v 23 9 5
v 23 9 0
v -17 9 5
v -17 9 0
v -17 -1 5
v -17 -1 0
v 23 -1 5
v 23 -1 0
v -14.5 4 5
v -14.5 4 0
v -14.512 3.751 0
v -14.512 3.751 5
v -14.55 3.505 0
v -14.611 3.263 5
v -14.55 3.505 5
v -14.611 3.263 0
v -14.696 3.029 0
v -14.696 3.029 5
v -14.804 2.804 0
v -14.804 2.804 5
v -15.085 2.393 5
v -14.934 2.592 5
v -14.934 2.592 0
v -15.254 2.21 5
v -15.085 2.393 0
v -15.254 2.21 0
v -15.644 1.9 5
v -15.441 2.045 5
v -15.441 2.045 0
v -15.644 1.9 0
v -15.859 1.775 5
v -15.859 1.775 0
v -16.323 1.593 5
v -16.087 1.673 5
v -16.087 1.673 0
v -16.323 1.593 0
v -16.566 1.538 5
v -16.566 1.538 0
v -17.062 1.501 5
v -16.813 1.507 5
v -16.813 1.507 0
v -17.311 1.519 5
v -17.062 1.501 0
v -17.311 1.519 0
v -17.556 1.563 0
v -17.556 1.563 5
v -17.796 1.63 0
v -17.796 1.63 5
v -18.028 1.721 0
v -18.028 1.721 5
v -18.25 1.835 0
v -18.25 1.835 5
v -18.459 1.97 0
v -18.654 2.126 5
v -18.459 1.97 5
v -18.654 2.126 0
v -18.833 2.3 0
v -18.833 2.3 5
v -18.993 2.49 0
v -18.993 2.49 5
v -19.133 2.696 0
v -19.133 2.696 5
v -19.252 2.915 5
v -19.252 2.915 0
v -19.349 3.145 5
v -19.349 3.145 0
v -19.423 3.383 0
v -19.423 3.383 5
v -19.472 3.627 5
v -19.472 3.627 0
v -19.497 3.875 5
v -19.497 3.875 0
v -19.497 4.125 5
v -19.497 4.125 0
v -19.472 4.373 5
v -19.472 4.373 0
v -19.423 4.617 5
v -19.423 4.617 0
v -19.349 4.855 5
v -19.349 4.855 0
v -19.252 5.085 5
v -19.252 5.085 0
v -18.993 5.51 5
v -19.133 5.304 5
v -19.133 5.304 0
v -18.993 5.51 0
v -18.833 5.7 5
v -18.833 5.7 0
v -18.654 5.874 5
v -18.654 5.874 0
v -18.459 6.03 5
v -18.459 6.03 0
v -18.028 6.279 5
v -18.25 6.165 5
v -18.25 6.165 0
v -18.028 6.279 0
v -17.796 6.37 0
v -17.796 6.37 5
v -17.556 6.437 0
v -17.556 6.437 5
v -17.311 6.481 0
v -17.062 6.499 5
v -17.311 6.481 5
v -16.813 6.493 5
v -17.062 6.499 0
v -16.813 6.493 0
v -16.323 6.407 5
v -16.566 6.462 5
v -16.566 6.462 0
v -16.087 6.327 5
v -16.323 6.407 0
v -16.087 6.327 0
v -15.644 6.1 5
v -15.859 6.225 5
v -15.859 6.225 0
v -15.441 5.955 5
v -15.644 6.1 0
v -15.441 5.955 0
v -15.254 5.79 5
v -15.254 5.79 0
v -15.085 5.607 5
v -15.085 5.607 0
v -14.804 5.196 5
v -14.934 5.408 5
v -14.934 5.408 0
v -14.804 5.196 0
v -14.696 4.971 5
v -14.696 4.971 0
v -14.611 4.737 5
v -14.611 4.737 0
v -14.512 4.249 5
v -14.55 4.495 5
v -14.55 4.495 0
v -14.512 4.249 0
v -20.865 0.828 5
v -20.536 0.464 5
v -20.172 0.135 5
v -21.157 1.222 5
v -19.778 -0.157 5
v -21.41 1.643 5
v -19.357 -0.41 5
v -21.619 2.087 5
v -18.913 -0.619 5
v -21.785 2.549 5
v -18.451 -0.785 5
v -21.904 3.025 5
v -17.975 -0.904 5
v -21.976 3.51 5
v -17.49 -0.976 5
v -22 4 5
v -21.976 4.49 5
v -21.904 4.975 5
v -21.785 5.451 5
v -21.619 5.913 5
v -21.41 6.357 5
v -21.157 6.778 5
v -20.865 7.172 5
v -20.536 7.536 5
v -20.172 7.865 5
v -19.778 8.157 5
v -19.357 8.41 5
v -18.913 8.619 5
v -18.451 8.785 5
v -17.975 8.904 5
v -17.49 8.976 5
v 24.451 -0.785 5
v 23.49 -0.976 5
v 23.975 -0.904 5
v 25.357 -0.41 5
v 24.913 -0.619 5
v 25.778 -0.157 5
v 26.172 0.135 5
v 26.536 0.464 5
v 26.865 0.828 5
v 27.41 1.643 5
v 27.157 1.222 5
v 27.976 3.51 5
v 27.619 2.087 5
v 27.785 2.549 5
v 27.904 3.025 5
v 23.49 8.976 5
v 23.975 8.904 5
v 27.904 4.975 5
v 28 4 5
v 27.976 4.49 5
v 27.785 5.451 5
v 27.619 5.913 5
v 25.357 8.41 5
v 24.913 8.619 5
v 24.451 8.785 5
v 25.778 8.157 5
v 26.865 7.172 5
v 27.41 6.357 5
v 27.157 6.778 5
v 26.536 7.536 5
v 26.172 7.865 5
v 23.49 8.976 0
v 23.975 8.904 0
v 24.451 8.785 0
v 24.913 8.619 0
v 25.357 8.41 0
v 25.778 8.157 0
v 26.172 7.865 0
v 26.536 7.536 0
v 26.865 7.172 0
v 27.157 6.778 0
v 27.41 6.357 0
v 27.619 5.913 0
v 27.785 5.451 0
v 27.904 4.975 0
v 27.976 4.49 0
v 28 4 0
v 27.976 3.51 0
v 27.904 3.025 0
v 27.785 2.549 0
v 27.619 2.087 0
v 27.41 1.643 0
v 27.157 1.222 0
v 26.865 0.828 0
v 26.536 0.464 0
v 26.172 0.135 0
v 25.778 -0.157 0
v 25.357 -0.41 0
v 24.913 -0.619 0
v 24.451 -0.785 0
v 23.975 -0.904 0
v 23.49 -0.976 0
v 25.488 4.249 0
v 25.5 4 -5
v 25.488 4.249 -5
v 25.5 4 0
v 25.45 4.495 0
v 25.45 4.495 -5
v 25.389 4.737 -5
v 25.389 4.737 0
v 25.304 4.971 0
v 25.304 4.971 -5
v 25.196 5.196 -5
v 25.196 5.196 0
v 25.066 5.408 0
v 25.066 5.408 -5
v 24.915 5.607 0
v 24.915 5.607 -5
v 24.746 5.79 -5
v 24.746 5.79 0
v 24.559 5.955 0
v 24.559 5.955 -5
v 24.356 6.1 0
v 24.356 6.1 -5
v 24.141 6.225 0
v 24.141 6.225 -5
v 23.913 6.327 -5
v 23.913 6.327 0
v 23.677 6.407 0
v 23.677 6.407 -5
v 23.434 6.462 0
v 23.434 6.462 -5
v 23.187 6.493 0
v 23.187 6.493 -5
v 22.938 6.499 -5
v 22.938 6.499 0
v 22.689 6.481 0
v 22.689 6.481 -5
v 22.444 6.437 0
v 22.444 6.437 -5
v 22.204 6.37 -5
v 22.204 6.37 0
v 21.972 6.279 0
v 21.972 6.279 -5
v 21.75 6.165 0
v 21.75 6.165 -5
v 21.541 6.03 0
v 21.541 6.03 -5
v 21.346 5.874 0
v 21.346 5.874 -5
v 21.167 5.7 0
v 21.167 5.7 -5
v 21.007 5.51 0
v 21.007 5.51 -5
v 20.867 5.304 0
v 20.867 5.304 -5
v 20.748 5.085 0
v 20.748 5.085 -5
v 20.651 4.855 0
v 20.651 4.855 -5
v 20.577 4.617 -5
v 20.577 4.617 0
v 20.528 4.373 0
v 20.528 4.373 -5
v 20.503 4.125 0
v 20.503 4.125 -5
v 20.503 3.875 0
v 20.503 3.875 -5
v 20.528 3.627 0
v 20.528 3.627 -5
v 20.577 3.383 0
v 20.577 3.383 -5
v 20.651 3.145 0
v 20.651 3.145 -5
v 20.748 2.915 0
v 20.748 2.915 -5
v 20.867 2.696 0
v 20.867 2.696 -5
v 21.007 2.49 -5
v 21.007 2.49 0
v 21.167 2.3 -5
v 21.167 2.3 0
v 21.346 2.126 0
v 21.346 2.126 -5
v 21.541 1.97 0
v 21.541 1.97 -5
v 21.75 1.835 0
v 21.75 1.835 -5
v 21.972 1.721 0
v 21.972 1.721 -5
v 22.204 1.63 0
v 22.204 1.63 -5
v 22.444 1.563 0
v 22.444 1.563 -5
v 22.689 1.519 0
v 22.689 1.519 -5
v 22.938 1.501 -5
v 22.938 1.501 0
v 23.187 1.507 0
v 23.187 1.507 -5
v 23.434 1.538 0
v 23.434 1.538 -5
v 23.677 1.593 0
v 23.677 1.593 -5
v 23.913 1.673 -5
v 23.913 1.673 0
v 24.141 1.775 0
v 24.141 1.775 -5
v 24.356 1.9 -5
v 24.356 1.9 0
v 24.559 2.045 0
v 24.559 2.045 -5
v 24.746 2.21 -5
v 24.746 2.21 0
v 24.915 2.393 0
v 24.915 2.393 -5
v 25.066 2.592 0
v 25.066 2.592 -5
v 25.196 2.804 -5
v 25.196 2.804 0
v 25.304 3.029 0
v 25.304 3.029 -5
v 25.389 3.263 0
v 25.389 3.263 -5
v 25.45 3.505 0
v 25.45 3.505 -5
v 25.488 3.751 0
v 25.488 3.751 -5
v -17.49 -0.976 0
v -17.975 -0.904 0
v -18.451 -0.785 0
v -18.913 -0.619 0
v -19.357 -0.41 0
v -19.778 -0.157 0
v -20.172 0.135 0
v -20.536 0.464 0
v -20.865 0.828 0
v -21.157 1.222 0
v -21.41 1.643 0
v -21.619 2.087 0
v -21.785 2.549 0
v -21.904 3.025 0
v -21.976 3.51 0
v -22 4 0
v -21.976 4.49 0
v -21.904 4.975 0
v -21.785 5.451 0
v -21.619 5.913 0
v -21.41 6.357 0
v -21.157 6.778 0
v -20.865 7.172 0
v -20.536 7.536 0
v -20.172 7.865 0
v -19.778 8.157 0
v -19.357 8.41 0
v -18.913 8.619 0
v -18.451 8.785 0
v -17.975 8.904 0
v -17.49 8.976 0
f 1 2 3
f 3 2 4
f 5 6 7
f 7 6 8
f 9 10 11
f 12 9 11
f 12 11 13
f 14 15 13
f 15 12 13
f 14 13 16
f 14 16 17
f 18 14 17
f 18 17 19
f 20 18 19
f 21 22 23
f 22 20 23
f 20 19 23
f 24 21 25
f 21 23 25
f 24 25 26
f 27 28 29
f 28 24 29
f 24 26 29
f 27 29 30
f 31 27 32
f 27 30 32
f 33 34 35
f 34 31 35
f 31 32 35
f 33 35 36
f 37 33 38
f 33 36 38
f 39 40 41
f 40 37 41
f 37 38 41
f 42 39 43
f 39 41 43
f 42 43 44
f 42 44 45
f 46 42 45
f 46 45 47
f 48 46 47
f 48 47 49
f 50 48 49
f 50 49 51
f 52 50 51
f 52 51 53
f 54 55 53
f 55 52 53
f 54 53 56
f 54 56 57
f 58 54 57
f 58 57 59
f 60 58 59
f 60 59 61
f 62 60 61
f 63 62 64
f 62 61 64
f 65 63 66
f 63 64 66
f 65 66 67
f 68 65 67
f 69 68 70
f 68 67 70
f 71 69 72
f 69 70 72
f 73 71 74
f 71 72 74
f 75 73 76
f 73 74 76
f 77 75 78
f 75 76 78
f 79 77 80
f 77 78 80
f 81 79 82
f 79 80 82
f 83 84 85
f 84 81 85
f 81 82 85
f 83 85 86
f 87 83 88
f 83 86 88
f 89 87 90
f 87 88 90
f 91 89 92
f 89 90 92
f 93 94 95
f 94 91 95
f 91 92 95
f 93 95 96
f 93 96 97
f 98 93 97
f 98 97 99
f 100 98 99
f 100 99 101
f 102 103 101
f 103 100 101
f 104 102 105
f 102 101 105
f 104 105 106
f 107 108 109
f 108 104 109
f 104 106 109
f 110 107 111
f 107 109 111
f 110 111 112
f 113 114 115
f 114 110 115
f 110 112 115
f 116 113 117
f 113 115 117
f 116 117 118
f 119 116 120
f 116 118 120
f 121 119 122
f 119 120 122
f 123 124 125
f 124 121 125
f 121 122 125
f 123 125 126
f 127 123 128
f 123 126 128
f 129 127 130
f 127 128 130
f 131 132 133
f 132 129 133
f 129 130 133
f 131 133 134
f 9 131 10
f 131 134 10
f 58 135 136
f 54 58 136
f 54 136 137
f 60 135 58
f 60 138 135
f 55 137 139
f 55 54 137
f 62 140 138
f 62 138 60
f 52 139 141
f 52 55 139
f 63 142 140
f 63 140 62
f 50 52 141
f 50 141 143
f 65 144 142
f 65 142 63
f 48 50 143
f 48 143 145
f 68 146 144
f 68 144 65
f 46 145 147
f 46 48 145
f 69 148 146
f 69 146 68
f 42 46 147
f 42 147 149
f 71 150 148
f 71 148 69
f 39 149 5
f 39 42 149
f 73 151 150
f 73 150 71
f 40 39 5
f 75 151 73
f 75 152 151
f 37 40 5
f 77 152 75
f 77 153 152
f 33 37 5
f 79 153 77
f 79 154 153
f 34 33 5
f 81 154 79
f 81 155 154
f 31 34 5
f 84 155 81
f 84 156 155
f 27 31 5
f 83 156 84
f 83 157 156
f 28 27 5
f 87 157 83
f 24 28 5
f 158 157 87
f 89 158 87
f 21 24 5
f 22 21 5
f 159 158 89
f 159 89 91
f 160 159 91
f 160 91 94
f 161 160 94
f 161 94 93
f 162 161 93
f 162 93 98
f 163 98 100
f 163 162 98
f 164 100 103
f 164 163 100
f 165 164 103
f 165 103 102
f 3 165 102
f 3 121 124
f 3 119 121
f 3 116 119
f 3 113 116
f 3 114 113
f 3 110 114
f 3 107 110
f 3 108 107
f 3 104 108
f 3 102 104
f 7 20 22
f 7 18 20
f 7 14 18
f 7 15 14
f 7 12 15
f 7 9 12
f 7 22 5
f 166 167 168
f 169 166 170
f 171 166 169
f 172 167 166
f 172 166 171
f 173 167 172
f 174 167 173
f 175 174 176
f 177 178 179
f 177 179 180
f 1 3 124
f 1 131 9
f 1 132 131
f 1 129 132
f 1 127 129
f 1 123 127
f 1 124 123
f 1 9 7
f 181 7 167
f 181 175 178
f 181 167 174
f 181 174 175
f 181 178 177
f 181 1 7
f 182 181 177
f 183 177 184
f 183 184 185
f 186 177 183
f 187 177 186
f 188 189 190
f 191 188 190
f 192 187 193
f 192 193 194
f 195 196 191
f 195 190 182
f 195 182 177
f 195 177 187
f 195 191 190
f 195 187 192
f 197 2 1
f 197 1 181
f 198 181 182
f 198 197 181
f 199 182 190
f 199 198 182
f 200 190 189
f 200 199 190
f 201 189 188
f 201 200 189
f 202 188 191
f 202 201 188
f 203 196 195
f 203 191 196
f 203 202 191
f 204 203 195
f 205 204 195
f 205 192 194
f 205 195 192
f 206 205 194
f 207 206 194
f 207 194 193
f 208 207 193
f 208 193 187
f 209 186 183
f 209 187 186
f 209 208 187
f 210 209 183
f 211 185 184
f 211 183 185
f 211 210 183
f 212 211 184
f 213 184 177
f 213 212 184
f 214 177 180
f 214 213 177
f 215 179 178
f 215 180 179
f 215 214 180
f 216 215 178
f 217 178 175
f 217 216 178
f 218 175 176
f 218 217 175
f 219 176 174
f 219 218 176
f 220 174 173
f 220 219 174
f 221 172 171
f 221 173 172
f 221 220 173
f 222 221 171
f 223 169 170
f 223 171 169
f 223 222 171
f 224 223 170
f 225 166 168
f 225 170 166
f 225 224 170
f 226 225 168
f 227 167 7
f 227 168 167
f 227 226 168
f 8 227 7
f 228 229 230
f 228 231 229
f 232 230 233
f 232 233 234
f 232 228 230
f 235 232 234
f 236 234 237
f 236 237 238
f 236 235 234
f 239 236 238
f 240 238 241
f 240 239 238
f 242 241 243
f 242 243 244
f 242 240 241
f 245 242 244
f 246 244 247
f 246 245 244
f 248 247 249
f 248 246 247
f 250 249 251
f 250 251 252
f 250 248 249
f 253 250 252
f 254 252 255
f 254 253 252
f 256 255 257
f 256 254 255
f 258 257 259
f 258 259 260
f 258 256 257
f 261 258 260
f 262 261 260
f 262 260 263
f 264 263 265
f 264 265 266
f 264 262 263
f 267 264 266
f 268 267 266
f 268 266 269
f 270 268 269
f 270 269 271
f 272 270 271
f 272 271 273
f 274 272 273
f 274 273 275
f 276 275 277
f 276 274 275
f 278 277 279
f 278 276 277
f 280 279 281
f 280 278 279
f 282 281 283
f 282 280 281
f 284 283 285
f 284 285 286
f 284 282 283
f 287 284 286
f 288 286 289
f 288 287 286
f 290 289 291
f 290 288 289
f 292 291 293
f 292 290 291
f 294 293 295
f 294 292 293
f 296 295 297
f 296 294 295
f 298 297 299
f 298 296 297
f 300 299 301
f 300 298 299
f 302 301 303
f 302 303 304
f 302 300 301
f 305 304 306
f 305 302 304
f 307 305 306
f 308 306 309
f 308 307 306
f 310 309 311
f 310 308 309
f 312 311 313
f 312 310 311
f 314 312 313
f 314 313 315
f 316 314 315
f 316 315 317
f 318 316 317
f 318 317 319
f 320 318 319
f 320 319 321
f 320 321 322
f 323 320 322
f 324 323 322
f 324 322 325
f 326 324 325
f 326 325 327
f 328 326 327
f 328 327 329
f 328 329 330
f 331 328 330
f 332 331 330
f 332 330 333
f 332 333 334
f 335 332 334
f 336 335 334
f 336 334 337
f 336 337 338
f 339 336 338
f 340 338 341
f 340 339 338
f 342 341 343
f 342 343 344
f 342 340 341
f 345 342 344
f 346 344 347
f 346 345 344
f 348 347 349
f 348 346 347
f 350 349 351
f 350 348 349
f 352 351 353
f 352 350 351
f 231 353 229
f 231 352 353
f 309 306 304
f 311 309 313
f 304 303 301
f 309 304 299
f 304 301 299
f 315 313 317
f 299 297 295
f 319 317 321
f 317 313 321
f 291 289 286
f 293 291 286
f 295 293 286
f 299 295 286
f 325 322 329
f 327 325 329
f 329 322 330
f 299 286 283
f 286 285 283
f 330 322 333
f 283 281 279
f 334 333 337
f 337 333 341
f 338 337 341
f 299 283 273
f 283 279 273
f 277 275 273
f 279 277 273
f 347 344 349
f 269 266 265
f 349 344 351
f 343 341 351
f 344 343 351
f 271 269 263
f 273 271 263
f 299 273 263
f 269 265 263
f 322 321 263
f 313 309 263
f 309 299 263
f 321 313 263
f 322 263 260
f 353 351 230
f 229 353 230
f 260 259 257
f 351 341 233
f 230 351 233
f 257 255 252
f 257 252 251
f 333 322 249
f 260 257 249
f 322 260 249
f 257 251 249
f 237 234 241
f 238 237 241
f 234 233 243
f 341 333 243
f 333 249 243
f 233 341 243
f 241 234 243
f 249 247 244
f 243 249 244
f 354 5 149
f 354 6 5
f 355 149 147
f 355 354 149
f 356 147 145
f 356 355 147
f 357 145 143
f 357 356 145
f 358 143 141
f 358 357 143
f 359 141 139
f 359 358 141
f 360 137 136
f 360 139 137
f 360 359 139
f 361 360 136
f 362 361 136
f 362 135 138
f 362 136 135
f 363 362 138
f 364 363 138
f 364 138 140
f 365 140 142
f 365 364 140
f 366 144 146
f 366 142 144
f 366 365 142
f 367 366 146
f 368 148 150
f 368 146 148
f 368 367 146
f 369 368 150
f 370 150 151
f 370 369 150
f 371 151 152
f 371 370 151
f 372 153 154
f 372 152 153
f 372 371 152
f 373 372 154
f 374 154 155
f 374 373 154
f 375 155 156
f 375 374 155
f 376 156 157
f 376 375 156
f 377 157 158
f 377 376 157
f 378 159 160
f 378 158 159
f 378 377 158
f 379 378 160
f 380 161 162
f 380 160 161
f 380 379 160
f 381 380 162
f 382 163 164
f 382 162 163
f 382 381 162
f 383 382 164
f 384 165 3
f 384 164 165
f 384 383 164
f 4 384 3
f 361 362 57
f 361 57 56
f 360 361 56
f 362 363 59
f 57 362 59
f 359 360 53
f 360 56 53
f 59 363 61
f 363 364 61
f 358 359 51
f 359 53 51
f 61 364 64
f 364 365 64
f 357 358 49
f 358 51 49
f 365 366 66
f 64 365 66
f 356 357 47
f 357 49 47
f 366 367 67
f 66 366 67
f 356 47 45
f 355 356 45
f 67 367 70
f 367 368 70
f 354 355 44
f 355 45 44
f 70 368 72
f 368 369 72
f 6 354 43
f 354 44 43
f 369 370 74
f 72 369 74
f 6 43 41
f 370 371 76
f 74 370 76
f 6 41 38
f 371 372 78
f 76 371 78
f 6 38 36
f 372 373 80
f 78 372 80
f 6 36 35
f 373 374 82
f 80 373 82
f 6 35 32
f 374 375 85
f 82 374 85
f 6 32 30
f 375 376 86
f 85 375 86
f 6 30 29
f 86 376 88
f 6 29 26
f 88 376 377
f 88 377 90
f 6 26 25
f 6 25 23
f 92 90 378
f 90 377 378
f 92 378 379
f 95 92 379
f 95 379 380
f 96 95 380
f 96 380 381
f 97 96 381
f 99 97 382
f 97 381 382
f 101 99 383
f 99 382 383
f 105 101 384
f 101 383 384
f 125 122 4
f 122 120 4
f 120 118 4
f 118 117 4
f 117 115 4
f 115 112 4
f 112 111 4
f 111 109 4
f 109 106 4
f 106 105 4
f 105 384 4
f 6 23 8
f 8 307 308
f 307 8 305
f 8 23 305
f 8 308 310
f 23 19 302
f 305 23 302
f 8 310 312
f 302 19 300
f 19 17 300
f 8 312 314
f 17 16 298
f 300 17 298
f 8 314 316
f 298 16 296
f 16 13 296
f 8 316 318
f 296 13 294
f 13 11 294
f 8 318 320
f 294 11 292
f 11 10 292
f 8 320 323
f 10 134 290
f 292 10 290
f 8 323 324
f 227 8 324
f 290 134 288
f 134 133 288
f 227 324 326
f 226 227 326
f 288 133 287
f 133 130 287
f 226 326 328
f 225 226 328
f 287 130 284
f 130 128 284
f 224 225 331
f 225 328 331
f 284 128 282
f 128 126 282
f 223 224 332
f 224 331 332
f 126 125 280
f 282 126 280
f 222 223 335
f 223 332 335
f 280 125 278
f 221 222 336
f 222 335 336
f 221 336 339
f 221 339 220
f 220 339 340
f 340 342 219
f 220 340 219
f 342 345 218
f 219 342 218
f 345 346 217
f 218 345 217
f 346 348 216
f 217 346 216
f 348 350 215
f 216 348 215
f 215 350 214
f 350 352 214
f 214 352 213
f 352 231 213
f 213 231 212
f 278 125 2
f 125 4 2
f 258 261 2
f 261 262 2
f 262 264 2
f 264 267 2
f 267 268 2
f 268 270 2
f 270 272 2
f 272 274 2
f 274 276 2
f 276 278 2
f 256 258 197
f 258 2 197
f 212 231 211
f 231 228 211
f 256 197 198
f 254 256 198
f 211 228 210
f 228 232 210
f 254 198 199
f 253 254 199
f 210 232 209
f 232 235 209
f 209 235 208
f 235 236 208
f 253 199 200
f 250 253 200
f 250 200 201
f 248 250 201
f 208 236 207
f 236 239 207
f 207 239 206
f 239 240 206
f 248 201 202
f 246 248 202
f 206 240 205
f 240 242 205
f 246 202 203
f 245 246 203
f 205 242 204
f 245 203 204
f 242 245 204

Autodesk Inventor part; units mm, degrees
ref_plane "YZ Plane" through (0, 0, 0) normal (1, 0, 0) x (0, 1, 0)
ref_plane "XZ Plane" through (0, 0, 0) normal (0, 1, 0) x (-1, 0, 0)
ref_plane "XY Plane" through (0, 0, 0) normal (0, 0, 1) x (1, 0, 0)
sketch "Sketch1" plane through (0, 0, 0) normal (0, 0, 1) x (1, 0, 0)
  line L0 (-17, 4) -> (23, 4) construction
  line L1 (-17, -1) -> (23, -1)
  line L2 (23, 9) -> (-17, 9)
  arc A0 (-17, 9) -> (-17, -1) centre (-17, 4) ccw
  arc A1 (23, -1) -> (23, 9) centre (23, 4) ccw
  circle A2 centre (-17, 4) radius 2.5
  circle A3 centre (23, 4) radius 2.5
  point P0 (0, 0)
  point P1 (3, 4)
  dimension "d0" = 40
  dimension "d1" = 10
  dimension "d2" = 5
extrude "Extrusion1" add sketch "Sketch1" along normal blind 5 contours A0 L2 A1 L1 | A3
extrude "Extrusion2" add sketch "Sketch1" against normal blind 5 contours A3
